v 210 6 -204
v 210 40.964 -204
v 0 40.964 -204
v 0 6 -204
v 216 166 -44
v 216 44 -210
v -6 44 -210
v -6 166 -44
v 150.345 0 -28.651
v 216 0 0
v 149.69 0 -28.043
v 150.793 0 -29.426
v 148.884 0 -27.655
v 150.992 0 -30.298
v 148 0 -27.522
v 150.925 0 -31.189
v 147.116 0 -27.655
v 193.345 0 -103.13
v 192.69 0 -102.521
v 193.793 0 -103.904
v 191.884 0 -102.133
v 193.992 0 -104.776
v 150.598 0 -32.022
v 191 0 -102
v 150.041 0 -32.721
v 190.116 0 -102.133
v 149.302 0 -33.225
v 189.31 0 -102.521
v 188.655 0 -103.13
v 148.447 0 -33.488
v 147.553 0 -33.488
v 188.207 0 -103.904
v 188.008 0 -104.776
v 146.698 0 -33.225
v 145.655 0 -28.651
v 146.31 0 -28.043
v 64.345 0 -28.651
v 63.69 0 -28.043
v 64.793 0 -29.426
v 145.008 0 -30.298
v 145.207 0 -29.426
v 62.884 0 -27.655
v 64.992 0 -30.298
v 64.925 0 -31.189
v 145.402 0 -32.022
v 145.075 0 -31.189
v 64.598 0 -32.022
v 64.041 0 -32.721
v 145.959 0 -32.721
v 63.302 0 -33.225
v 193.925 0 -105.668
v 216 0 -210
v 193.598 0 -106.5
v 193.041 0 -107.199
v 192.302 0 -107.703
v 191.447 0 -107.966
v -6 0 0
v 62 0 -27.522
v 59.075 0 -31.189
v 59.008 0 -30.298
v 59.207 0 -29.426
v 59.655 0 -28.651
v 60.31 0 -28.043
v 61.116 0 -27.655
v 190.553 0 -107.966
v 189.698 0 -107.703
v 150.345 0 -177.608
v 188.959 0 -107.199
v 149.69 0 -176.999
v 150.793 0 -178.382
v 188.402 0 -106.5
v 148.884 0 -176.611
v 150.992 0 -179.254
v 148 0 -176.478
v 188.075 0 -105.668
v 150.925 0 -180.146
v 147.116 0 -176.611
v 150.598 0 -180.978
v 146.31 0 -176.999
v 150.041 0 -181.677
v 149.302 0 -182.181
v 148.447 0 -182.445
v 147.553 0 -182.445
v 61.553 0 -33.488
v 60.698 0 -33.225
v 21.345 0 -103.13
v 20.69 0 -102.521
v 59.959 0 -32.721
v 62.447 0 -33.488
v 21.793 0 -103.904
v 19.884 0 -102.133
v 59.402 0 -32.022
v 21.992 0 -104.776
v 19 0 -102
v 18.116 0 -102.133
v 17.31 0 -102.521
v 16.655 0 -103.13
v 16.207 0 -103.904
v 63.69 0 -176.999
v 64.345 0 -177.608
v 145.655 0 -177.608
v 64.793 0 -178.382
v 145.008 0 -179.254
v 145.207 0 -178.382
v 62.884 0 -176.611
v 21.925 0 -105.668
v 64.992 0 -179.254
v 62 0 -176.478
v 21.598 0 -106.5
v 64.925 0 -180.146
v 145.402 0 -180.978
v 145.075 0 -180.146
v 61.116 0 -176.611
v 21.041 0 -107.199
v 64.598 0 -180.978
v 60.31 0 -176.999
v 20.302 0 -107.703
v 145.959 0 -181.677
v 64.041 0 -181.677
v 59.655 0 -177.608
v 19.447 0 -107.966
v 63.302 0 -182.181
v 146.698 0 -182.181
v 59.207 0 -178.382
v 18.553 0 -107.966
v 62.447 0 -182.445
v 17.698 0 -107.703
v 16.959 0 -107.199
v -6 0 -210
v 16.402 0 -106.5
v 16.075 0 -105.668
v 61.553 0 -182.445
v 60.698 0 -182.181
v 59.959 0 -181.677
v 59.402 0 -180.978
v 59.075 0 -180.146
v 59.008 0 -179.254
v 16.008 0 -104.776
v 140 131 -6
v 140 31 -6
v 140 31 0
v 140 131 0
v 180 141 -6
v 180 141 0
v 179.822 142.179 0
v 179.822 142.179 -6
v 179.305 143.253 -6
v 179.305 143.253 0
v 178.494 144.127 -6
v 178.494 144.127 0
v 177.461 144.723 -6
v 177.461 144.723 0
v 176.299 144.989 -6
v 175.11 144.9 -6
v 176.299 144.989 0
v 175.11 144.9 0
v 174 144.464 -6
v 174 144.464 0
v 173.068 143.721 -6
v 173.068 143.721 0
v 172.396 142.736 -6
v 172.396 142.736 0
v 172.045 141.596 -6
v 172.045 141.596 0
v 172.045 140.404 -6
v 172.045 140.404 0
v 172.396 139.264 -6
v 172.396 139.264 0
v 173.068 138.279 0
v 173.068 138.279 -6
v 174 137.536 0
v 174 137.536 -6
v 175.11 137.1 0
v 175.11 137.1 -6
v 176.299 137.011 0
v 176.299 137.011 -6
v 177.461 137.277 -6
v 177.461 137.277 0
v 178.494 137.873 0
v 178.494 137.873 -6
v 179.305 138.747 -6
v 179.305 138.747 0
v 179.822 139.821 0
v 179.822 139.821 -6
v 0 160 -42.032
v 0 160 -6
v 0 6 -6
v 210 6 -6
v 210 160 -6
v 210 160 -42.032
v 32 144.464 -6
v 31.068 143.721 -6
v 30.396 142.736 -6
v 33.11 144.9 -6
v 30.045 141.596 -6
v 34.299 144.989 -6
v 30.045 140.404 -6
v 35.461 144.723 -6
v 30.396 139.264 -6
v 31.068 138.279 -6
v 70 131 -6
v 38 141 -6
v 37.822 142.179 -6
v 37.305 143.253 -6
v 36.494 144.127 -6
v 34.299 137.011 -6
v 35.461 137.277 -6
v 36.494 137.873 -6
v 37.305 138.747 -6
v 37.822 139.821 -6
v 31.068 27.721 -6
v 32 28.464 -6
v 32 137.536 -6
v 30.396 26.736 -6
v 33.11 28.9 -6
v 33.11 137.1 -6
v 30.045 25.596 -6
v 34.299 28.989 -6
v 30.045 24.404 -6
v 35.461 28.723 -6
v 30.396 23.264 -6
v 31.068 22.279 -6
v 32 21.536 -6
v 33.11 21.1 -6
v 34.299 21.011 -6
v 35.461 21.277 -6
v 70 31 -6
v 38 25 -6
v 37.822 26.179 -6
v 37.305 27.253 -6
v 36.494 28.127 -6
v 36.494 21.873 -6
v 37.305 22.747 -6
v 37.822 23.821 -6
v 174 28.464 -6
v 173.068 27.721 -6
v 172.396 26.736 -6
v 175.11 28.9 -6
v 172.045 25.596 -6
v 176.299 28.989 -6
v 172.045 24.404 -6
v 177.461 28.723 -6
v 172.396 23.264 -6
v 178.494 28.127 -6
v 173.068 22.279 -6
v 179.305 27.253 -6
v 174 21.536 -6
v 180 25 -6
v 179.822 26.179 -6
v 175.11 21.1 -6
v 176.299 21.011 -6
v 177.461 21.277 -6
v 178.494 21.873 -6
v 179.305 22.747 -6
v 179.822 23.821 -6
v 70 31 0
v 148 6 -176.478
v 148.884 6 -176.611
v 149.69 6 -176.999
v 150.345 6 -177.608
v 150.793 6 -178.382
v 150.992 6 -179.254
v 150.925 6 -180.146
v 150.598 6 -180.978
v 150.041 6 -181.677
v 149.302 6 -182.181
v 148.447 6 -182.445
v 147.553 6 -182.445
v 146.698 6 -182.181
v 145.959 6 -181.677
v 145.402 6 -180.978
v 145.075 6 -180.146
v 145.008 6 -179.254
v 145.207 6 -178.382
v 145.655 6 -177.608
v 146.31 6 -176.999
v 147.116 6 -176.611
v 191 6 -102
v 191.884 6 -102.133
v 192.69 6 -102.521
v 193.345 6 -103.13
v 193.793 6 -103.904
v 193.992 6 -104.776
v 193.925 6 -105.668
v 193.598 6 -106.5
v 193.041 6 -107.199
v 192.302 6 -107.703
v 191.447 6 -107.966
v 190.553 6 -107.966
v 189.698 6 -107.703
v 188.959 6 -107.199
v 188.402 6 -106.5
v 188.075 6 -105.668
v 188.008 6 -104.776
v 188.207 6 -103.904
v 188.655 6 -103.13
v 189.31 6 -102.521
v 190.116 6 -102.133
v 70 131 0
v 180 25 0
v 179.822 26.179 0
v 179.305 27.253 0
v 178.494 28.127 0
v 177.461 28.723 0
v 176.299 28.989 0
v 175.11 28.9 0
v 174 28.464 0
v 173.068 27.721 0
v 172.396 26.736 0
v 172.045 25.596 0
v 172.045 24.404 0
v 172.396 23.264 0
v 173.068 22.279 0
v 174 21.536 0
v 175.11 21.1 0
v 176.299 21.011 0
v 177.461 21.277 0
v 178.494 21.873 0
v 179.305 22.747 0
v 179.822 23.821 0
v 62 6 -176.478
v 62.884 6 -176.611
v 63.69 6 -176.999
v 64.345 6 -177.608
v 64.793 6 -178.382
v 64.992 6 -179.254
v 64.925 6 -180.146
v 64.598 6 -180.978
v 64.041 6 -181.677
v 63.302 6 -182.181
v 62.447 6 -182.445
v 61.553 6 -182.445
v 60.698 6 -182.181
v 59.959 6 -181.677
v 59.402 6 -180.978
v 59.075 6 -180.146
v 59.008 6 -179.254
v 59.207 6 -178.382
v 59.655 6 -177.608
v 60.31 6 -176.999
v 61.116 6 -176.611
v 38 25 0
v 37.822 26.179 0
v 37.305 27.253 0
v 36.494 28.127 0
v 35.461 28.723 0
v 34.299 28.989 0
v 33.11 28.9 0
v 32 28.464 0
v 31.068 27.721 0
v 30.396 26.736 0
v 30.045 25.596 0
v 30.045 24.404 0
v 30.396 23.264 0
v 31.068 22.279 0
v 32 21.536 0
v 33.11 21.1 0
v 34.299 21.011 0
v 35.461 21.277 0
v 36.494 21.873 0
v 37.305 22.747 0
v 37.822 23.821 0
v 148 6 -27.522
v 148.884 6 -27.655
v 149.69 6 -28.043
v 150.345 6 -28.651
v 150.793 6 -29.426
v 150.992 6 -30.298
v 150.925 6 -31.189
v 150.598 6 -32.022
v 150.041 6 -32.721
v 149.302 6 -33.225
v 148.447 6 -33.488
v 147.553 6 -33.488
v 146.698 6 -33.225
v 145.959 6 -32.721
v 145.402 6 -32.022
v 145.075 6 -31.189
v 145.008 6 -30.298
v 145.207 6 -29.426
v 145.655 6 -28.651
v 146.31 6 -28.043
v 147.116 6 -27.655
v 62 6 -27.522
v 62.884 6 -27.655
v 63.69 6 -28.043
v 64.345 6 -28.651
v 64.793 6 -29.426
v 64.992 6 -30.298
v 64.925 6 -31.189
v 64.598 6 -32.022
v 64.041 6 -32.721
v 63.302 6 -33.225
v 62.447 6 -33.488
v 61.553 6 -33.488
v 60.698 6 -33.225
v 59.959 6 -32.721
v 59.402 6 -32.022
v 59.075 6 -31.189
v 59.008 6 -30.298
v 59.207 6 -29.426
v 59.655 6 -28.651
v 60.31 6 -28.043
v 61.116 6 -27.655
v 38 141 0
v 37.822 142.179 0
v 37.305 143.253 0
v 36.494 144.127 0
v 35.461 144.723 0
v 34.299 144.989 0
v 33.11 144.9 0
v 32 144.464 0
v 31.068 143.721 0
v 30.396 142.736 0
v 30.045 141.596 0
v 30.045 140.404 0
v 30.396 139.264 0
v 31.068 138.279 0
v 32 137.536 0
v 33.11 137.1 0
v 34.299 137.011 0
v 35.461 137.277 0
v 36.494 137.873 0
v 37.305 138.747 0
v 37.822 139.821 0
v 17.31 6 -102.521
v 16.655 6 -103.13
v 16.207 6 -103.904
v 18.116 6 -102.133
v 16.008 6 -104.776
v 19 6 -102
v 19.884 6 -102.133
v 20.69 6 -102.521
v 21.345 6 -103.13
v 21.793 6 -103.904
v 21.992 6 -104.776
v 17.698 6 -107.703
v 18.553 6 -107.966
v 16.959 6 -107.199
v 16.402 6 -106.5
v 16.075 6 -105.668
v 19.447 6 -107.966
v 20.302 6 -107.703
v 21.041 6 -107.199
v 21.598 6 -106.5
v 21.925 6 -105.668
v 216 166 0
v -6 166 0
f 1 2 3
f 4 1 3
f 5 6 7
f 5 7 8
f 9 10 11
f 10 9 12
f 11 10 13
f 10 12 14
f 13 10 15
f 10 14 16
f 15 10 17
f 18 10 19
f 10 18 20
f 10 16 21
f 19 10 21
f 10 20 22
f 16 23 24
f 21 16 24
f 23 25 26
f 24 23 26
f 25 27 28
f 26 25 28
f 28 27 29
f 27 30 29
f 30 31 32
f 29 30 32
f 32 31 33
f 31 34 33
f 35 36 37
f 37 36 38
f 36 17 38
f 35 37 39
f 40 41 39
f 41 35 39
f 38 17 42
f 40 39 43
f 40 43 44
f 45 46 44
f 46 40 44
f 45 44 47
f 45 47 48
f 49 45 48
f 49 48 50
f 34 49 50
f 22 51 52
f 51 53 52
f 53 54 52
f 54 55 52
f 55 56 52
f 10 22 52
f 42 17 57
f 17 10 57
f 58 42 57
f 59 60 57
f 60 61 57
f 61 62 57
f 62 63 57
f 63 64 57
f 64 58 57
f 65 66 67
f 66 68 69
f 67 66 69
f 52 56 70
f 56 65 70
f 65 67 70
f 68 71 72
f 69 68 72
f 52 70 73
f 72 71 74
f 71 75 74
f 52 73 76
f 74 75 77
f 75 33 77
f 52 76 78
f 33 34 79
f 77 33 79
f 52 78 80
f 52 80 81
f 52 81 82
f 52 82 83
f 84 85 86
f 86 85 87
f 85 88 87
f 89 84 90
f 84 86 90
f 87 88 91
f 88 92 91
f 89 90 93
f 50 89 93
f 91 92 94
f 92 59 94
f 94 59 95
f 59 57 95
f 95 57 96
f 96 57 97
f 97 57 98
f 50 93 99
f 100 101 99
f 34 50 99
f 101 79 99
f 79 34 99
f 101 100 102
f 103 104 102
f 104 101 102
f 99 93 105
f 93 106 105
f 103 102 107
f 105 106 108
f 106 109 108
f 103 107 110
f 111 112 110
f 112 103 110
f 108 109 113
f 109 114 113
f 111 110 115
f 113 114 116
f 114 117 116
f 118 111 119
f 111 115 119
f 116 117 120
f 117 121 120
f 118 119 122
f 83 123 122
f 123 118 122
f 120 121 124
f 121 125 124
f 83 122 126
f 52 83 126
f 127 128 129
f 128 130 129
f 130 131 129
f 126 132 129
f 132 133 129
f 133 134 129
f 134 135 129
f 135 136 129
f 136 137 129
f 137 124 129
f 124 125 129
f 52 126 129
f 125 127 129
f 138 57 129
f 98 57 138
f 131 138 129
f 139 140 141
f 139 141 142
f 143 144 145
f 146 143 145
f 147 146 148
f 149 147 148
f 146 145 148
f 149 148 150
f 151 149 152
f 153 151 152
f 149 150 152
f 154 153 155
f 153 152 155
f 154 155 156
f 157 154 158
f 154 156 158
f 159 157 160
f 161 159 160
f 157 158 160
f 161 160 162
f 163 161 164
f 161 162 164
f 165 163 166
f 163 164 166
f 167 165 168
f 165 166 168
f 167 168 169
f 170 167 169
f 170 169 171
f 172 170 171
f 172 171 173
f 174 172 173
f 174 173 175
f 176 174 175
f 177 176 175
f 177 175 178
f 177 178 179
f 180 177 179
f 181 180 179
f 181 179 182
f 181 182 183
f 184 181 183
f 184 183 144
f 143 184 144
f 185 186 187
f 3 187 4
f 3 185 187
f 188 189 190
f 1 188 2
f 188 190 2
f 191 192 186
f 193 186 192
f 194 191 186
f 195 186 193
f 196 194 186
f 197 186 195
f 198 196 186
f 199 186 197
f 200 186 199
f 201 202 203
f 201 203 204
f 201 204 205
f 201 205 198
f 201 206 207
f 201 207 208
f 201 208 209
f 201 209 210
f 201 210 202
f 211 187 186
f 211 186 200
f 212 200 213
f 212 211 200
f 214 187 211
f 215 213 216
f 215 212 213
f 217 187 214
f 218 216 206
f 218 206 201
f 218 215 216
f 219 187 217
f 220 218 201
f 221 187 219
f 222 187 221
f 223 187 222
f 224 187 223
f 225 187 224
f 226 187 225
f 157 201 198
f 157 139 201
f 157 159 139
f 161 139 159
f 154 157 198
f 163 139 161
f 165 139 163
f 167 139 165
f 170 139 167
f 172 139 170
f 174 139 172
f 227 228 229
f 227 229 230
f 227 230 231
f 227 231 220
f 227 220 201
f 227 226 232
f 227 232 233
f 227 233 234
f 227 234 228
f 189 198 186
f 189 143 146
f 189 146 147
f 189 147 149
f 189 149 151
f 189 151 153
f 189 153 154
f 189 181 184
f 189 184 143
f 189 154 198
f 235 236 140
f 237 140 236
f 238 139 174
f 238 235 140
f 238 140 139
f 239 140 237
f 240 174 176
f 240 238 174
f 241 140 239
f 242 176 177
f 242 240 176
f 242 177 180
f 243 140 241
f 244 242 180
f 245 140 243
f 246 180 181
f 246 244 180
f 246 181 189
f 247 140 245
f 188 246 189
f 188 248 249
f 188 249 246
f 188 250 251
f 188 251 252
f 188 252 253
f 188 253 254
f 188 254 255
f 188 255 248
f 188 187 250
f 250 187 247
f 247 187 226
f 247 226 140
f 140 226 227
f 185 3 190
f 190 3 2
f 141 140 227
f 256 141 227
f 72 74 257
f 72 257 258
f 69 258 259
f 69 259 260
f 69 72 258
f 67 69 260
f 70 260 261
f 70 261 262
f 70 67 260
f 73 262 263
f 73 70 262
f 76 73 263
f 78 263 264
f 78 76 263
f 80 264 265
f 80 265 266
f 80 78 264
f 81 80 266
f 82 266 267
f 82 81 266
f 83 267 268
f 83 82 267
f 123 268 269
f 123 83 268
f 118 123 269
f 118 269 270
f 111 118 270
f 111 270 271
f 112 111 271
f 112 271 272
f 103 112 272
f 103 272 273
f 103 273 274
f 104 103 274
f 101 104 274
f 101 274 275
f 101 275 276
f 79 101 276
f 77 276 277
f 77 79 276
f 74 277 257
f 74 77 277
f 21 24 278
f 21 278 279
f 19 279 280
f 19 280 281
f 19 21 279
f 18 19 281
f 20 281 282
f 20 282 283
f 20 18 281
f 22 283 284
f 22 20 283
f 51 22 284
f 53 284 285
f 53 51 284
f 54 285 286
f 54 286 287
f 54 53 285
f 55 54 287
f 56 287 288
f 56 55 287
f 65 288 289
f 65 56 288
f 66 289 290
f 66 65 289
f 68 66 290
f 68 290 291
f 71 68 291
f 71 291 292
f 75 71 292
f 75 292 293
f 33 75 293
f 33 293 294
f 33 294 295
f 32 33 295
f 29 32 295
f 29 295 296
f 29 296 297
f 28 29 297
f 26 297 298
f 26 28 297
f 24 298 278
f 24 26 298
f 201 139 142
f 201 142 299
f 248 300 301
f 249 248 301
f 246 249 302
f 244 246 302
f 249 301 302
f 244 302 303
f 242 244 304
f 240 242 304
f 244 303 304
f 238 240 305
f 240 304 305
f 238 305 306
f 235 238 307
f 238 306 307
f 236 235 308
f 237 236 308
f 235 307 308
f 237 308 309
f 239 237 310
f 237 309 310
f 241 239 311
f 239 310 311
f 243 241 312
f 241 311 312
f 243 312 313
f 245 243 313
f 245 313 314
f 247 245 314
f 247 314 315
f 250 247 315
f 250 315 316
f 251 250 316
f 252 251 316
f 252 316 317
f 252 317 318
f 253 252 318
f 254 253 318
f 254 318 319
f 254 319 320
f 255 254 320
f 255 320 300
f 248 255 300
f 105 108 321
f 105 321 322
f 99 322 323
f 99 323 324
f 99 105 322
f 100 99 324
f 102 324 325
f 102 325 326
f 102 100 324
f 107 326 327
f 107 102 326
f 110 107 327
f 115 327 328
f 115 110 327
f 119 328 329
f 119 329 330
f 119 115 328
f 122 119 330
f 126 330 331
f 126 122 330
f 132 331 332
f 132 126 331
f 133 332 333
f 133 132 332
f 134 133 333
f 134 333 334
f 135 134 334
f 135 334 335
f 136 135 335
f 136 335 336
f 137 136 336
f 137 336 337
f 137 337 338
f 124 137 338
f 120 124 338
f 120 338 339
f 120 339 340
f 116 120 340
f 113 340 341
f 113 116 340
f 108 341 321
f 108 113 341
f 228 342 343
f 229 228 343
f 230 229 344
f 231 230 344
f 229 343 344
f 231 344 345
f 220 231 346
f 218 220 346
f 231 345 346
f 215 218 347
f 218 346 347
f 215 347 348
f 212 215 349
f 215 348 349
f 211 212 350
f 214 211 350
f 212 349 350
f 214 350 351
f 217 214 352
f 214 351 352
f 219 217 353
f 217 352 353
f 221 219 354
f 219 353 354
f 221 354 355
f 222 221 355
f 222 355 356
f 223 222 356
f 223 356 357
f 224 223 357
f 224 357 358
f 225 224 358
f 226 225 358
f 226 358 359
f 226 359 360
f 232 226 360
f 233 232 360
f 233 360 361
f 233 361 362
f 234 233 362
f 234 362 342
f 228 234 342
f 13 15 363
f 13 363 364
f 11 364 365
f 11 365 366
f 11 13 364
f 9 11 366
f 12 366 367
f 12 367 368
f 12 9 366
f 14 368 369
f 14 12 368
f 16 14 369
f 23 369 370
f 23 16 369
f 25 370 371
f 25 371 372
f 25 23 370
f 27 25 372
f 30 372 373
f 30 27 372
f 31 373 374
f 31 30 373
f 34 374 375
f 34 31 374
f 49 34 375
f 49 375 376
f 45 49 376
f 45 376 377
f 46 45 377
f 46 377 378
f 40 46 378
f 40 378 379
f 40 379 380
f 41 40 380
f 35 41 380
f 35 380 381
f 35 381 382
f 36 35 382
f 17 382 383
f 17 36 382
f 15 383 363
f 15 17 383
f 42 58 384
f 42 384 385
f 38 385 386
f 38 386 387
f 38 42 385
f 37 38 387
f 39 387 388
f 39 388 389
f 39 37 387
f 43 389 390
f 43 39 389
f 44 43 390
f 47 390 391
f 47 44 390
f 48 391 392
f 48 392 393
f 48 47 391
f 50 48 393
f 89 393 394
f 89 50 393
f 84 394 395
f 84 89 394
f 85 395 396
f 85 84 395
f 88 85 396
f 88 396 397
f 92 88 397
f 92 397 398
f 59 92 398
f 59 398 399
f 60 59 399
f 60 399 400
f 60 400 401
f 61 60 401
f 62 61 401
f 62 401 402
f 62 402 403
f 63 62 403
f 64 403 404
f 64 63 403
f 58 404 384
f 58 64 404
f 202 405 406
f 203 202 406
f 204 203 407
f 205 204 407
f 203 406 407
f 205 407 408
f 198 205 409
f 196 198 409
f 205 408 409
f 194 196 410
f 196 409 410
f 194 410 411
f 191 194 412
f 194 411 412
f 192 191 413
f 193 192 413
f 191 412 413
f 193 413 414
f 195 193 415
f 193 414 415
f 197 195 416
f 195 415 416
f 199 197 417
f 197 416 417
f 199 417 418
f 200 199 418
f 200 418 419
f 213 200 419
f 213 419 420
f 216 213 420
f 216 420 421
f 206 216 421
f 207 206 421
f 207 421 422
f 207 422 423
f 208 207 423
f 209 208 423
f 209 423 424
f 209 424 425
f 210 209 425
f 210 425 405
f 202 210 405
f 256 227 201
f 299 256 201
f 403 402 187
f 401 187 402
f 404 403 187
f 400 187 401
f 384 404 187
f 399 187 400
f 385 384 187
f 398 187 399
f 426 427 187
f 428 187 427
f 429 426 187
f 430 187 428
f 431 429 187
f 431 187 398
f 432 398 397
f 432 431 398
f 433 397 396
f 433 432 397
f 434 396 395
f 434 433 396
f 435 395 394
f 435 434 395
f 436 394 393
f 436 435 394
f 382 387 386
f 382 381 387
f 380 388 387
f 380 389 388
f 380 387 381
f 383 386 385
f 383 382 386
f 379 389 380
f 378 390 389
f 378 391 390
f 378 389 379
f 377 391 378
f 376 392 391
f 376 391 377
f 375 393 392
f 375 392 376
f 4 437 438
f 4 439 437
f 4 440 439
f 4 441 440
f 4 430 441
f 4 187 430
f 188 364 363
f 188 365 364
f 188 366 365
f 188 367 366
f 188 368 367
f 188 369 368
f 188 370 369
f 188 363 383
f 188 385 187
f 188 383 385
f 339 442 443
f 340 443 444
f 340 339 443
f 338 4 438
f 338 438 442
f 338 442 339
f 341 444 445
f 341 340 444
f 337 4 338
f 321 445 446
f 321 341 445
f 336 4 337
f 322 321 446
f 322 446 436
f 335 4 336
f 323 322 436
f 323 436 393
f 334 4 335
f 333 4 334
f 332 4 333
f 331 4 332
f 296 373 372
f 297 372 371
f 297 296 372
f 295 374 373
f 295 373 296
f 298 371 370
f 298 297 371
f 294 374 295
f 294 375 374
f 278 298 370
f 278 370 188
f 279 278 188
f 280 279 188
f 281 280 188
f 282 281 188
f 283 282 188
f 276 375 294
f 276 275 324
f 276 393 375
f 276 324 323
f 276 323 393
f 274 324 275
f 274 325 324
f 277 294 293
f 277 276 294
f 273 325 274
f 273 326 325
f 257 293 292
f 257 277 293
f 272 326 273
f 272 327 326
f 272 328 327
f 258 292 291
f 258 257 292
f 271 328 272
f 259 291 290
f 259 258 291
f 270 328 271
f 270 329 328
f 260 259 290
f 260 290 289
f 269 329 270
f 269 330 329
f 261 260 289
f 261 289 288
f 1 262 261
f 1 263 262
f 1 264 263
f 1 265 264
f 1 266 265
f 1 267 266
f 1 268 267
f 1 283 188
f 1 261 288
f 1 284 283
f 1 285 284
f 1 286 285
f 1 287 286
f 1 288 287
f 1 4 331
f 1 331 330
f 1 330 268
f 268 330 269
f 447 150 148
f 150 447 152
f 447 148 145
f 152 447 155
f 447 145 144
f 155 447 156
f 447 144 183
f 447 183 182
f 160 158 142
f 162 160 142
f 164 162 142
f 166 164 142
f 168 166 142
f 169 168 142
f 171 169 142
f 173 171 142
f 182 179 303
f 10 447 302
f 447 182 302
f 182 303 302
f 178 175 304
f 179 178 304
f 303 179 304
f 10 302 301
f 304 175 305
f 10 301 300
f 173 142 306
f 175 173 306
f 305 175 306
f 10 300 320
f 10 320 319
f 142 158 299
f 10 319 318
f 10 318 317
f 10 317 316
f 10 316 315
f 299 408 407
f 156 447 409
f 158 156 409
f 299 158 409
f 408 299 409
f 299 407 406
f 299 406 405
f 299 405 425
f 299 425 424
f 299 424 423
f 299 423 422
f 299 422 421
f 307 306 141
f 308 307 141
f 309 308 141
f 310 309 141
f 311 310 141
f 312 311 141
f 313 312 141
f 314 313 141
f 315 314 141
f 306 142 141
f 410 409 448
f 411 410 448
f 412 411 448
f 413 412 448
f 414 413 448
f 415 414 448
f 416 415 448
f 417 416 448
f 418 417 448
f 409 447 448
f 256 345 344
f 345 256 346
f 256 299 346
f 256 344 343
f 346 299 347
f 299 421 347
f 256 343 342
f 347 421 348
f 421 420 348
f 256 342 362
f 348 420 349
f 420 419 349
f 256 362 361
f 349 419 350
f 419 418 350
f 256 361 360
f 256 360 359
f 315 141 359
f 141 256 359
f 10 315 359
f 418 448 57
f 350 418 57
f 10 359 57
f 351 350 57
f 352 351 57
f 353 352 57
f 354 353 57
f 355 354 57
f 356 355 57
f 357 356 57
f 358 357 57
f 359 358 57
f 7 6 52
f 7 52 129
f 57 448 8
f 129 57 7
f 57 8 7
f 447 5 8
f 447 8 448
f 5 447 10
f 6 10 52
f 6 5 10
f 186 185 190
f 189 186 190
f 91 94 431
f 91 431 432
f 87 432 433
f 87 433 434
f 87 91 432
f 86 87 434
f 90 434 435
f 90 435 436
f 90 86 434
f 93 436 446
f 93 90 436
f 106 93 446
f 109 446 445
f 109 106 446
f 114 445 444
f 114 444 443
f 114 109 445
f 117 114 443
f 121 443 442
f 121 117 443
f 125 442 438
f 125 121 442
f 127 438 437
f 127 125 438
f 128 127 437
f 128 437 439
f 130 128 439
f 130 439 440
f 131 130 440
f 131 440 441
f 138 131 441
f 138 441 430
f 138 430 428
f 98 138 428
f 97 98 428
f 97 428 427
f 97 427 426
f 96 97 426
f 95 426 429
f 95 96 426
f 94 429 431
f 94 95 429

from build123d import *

# Parameters (mm, degrees)
SKETCH1_W           = 210
SKETCH1_H           = 210
SKETCH1_R           = 3
BOSS_EXTRUDE1_DEPTH = 6
SKETCH3_W           = 210
SKETCH3_H           = 6
BOSS_EXTRUDE2_DEPTH = 160
BOSS_EXTRUDE4_DEPTH = 6
BOSS_EXTRUDE5_START = -210
BOSS_EXTRUDE5_DEPTH = 6
SKETCH6_W           = 70
SKETCH6_H           = 100
CUT_EXTRUDE1_DEPTH  = 341.335128954
SKETCH7_W           = 210
SKETCH7_H           = 38
BOSS_EXTRUDE6_DEPTH = 6
SKETCH8_W           = 222
SKETCH8_H           = 206.009708509
BOSS_EXTRUDE7_DEPTH = 6
SKETCH9_W           = 222
SKETCH9_H           = 44
BOSS_EXTRUDE8_DEPTH = 6
CUT_EXTRUDE2_REACH  = 345.965
SKETCH10_R          = 4


with BuildPart() as part:
    # Sketch1 → Boss-Extrude1 (new body)
    with BuildSketch(Plane(origin=(0, 0, 0), x_dir=(1, 0, 0), z_dir=(0, 1, 0))):
        with Locations((105, 105)):
            Rectangle(SKETCH1_W, SKETCH1_H)
        with Locations((62, 179.478184725)):
            Circle(SKETCH1_R, mode=Mode.SUBTRACT)
        with Locations((148, 179.478184725)):
            Circle(SKETCH1_R, mode=Mode.SUBTRACT)
        with Locations((191, 105)):
            Circle(SKETCH1_R, mode=Mode.SUBTRACT)
        with Locations((148, 30.521815275)):
            Circle(SKETCH1_R, mode=Mode.SUBTRACT)
        with Locations((62, 30.521815275)):
            Circle(SKETCH1_R, mode=Mode.SUBTRACT)
        with Locations((19, 105)):
            Circle(SKETCH1_R, mode=Mode.SUBTRACT)
    extrude(amount=BOSS_EXTRUDE1_DEPTH)

    # Sketch3 → Boss-Extrude2 (add)
    with BuildSketch(Plane(origin=(0, 6, 0), x_dir=(1, 0, 0), z_dir=(0, 1, 0))):
        with Locations((105, 3)):
            Rectangle(SKETCH3_W, SKETCH3_H)
    extrude(amount=BOSS_EXTRUDE2_DEPTH)

    # Sketch4 → Boss-Extrude4 (add)
    with BuildSketch(Plane.ZY):
        Polygon((0, 0), (-210, 0), (-210, 44), (-44, 166), (0, 166), align=None)
    extrude(amount=BOSS_EXTRUDE4_DEPTH)

    # Sketch4<3> → Boss-Extrude5 (add)
    with BuildSketch(Plane.ZY.offset(BOSS_EXTRUDE5_START)):
        Polygon((0, 0), (-210, 0), (-210, 44), (-44, 166), (0, 166), align=None)
    extrude(amount=-BOSS_EXTRUDE5_DEPTH)

    # Sketch6 → Cut-Extrude1 (cut, through all)
    with BuildSketch(Plane(origin=(0, 0, -6), x_dir=(-1, 0, 0), z_dir=(0, 0, -1))):
        with Locations((-105, 81)):
            Rectangle(SKETCH6_W, SKETCH6_H)
    extrude(amount=-CUT_EXTRUDE1_DEPTH, mode=Mode.SUBTRACT)

    # Sketch7 → Boss-Extrude6 (add)
    with BuildSketch(Plane(origin=(0, 0, -210), x_dir=(-1, 0, 0), z_dir=(0, 0, -1))):
        with Locations((-105, 25)):
            Rectangle(SKETCH7_W, SKETCH7_H)
    extrude(amount=-BOSS_EXTRUDE6_DEPTH)

    # Sketch8 → Boss-Extrude7 (add)
    with BuildSketch(Plane(origin=(0, 128.779076343, -94.644863336), x_dir=(1, 0, 0), z_dir=(0, 0.8057872670242422, -0.5922050998611905))):
        with Locations((105, 40.153447427)):
            Rectangle(SKETCH8_W, SKETCH8_H)
    extrude(amount=-BOSS_EXTRUDE7_DEPTH)

    # Sketch9 → Boss-Extrude8 (add)
    with BuildSketch(Plane(origin=(0, 166, 0), x_dir=(1, 0, 0), z_dir=(0, 1, 0))):
        with Locations((105, 22)):
            Rectangle(SKETCH9_W, SKETCH9_H)
    extrude(amount=-BOSS_EXTRUDE8_DEPTH)

    # Sketch10 → Cut-Extrude2 (cut, up to next)
    with BuildSketch(Plane.XY, mode=Mode.PRIVATE) as cut_extrude2_sk1:
        with Locations((176, 141)):
            Circle(SKETCH10_R)
    cut_extrude2_tool1 = extrude(cut_extrude2_sk1.sketch, amount=-CUT_EXTRUDE2_REACH, mode=Mode.PRIVATE) & part.part
    # Sketch10 → Cut-Extrude2 (cut, up to next)
    with BuildSketch(Plane.XY, mode=Mode.PRIVATE) as cut_extrude2_sk2:
        with Locations((34, 141)):
            Circle(SKETCH10_R)
    cut_extrude2_tool2 = extrude(cut_extrude2_sk2.sketch, amount=-CUT_EXTRUDE2_REACH, mode=Mode.PRIVATE) & part.part
    # Sketch10 → Cut-Extrude2 (cut, up to next)
    with BuildSketch(Plane.XY, mode=Mode.PRIVATE) as cut_extrude2_sk3:
        with Locations((34, 25)):
            Circle(SKETCH10_R)
    cut_extrude2_tool3 = extrude(cut_extrude2_sk3.sketch, amount=-CUT_EXTRUDE2_REACH, mode=Mode.PRIVATE) & part.part
    # Sketch10 → Cut-Extrude2 (cut, up to next)
    with BuildSketch(Plane.XY, mode=Mode.PRIVATE) as cut_extrude2_sk4:
        with Locations((176, 25)):
            Circle(SKETCH10_R)
    cut_extrude2_tool4 = extrude(cut_extrude2_sk4.sketch, amount=-CUT_EXTRUDE2_REACH, mode=Mode.PRIVATE) & part.part
    add(cut_extrude2_tool1.solids().sort_by_distance((176, 141, 0))[0], mode=Mode.SUBTRACT)
    add(cut_extrude2_tool2.solids().sort_by_distance((34, 141, 0))[0], mode=Mode.SUBTRACT)
    add(cut_extrude2_tool3.solids().sort_by_distance((34, 25, 0))[0], mode=Mode.SUBTRACT)
    add(cut_extrude2_tool4.solids().sort_by_distance((176, 25, 0))[0], mode=Mode.SUBTRACT)


solid = part.part
